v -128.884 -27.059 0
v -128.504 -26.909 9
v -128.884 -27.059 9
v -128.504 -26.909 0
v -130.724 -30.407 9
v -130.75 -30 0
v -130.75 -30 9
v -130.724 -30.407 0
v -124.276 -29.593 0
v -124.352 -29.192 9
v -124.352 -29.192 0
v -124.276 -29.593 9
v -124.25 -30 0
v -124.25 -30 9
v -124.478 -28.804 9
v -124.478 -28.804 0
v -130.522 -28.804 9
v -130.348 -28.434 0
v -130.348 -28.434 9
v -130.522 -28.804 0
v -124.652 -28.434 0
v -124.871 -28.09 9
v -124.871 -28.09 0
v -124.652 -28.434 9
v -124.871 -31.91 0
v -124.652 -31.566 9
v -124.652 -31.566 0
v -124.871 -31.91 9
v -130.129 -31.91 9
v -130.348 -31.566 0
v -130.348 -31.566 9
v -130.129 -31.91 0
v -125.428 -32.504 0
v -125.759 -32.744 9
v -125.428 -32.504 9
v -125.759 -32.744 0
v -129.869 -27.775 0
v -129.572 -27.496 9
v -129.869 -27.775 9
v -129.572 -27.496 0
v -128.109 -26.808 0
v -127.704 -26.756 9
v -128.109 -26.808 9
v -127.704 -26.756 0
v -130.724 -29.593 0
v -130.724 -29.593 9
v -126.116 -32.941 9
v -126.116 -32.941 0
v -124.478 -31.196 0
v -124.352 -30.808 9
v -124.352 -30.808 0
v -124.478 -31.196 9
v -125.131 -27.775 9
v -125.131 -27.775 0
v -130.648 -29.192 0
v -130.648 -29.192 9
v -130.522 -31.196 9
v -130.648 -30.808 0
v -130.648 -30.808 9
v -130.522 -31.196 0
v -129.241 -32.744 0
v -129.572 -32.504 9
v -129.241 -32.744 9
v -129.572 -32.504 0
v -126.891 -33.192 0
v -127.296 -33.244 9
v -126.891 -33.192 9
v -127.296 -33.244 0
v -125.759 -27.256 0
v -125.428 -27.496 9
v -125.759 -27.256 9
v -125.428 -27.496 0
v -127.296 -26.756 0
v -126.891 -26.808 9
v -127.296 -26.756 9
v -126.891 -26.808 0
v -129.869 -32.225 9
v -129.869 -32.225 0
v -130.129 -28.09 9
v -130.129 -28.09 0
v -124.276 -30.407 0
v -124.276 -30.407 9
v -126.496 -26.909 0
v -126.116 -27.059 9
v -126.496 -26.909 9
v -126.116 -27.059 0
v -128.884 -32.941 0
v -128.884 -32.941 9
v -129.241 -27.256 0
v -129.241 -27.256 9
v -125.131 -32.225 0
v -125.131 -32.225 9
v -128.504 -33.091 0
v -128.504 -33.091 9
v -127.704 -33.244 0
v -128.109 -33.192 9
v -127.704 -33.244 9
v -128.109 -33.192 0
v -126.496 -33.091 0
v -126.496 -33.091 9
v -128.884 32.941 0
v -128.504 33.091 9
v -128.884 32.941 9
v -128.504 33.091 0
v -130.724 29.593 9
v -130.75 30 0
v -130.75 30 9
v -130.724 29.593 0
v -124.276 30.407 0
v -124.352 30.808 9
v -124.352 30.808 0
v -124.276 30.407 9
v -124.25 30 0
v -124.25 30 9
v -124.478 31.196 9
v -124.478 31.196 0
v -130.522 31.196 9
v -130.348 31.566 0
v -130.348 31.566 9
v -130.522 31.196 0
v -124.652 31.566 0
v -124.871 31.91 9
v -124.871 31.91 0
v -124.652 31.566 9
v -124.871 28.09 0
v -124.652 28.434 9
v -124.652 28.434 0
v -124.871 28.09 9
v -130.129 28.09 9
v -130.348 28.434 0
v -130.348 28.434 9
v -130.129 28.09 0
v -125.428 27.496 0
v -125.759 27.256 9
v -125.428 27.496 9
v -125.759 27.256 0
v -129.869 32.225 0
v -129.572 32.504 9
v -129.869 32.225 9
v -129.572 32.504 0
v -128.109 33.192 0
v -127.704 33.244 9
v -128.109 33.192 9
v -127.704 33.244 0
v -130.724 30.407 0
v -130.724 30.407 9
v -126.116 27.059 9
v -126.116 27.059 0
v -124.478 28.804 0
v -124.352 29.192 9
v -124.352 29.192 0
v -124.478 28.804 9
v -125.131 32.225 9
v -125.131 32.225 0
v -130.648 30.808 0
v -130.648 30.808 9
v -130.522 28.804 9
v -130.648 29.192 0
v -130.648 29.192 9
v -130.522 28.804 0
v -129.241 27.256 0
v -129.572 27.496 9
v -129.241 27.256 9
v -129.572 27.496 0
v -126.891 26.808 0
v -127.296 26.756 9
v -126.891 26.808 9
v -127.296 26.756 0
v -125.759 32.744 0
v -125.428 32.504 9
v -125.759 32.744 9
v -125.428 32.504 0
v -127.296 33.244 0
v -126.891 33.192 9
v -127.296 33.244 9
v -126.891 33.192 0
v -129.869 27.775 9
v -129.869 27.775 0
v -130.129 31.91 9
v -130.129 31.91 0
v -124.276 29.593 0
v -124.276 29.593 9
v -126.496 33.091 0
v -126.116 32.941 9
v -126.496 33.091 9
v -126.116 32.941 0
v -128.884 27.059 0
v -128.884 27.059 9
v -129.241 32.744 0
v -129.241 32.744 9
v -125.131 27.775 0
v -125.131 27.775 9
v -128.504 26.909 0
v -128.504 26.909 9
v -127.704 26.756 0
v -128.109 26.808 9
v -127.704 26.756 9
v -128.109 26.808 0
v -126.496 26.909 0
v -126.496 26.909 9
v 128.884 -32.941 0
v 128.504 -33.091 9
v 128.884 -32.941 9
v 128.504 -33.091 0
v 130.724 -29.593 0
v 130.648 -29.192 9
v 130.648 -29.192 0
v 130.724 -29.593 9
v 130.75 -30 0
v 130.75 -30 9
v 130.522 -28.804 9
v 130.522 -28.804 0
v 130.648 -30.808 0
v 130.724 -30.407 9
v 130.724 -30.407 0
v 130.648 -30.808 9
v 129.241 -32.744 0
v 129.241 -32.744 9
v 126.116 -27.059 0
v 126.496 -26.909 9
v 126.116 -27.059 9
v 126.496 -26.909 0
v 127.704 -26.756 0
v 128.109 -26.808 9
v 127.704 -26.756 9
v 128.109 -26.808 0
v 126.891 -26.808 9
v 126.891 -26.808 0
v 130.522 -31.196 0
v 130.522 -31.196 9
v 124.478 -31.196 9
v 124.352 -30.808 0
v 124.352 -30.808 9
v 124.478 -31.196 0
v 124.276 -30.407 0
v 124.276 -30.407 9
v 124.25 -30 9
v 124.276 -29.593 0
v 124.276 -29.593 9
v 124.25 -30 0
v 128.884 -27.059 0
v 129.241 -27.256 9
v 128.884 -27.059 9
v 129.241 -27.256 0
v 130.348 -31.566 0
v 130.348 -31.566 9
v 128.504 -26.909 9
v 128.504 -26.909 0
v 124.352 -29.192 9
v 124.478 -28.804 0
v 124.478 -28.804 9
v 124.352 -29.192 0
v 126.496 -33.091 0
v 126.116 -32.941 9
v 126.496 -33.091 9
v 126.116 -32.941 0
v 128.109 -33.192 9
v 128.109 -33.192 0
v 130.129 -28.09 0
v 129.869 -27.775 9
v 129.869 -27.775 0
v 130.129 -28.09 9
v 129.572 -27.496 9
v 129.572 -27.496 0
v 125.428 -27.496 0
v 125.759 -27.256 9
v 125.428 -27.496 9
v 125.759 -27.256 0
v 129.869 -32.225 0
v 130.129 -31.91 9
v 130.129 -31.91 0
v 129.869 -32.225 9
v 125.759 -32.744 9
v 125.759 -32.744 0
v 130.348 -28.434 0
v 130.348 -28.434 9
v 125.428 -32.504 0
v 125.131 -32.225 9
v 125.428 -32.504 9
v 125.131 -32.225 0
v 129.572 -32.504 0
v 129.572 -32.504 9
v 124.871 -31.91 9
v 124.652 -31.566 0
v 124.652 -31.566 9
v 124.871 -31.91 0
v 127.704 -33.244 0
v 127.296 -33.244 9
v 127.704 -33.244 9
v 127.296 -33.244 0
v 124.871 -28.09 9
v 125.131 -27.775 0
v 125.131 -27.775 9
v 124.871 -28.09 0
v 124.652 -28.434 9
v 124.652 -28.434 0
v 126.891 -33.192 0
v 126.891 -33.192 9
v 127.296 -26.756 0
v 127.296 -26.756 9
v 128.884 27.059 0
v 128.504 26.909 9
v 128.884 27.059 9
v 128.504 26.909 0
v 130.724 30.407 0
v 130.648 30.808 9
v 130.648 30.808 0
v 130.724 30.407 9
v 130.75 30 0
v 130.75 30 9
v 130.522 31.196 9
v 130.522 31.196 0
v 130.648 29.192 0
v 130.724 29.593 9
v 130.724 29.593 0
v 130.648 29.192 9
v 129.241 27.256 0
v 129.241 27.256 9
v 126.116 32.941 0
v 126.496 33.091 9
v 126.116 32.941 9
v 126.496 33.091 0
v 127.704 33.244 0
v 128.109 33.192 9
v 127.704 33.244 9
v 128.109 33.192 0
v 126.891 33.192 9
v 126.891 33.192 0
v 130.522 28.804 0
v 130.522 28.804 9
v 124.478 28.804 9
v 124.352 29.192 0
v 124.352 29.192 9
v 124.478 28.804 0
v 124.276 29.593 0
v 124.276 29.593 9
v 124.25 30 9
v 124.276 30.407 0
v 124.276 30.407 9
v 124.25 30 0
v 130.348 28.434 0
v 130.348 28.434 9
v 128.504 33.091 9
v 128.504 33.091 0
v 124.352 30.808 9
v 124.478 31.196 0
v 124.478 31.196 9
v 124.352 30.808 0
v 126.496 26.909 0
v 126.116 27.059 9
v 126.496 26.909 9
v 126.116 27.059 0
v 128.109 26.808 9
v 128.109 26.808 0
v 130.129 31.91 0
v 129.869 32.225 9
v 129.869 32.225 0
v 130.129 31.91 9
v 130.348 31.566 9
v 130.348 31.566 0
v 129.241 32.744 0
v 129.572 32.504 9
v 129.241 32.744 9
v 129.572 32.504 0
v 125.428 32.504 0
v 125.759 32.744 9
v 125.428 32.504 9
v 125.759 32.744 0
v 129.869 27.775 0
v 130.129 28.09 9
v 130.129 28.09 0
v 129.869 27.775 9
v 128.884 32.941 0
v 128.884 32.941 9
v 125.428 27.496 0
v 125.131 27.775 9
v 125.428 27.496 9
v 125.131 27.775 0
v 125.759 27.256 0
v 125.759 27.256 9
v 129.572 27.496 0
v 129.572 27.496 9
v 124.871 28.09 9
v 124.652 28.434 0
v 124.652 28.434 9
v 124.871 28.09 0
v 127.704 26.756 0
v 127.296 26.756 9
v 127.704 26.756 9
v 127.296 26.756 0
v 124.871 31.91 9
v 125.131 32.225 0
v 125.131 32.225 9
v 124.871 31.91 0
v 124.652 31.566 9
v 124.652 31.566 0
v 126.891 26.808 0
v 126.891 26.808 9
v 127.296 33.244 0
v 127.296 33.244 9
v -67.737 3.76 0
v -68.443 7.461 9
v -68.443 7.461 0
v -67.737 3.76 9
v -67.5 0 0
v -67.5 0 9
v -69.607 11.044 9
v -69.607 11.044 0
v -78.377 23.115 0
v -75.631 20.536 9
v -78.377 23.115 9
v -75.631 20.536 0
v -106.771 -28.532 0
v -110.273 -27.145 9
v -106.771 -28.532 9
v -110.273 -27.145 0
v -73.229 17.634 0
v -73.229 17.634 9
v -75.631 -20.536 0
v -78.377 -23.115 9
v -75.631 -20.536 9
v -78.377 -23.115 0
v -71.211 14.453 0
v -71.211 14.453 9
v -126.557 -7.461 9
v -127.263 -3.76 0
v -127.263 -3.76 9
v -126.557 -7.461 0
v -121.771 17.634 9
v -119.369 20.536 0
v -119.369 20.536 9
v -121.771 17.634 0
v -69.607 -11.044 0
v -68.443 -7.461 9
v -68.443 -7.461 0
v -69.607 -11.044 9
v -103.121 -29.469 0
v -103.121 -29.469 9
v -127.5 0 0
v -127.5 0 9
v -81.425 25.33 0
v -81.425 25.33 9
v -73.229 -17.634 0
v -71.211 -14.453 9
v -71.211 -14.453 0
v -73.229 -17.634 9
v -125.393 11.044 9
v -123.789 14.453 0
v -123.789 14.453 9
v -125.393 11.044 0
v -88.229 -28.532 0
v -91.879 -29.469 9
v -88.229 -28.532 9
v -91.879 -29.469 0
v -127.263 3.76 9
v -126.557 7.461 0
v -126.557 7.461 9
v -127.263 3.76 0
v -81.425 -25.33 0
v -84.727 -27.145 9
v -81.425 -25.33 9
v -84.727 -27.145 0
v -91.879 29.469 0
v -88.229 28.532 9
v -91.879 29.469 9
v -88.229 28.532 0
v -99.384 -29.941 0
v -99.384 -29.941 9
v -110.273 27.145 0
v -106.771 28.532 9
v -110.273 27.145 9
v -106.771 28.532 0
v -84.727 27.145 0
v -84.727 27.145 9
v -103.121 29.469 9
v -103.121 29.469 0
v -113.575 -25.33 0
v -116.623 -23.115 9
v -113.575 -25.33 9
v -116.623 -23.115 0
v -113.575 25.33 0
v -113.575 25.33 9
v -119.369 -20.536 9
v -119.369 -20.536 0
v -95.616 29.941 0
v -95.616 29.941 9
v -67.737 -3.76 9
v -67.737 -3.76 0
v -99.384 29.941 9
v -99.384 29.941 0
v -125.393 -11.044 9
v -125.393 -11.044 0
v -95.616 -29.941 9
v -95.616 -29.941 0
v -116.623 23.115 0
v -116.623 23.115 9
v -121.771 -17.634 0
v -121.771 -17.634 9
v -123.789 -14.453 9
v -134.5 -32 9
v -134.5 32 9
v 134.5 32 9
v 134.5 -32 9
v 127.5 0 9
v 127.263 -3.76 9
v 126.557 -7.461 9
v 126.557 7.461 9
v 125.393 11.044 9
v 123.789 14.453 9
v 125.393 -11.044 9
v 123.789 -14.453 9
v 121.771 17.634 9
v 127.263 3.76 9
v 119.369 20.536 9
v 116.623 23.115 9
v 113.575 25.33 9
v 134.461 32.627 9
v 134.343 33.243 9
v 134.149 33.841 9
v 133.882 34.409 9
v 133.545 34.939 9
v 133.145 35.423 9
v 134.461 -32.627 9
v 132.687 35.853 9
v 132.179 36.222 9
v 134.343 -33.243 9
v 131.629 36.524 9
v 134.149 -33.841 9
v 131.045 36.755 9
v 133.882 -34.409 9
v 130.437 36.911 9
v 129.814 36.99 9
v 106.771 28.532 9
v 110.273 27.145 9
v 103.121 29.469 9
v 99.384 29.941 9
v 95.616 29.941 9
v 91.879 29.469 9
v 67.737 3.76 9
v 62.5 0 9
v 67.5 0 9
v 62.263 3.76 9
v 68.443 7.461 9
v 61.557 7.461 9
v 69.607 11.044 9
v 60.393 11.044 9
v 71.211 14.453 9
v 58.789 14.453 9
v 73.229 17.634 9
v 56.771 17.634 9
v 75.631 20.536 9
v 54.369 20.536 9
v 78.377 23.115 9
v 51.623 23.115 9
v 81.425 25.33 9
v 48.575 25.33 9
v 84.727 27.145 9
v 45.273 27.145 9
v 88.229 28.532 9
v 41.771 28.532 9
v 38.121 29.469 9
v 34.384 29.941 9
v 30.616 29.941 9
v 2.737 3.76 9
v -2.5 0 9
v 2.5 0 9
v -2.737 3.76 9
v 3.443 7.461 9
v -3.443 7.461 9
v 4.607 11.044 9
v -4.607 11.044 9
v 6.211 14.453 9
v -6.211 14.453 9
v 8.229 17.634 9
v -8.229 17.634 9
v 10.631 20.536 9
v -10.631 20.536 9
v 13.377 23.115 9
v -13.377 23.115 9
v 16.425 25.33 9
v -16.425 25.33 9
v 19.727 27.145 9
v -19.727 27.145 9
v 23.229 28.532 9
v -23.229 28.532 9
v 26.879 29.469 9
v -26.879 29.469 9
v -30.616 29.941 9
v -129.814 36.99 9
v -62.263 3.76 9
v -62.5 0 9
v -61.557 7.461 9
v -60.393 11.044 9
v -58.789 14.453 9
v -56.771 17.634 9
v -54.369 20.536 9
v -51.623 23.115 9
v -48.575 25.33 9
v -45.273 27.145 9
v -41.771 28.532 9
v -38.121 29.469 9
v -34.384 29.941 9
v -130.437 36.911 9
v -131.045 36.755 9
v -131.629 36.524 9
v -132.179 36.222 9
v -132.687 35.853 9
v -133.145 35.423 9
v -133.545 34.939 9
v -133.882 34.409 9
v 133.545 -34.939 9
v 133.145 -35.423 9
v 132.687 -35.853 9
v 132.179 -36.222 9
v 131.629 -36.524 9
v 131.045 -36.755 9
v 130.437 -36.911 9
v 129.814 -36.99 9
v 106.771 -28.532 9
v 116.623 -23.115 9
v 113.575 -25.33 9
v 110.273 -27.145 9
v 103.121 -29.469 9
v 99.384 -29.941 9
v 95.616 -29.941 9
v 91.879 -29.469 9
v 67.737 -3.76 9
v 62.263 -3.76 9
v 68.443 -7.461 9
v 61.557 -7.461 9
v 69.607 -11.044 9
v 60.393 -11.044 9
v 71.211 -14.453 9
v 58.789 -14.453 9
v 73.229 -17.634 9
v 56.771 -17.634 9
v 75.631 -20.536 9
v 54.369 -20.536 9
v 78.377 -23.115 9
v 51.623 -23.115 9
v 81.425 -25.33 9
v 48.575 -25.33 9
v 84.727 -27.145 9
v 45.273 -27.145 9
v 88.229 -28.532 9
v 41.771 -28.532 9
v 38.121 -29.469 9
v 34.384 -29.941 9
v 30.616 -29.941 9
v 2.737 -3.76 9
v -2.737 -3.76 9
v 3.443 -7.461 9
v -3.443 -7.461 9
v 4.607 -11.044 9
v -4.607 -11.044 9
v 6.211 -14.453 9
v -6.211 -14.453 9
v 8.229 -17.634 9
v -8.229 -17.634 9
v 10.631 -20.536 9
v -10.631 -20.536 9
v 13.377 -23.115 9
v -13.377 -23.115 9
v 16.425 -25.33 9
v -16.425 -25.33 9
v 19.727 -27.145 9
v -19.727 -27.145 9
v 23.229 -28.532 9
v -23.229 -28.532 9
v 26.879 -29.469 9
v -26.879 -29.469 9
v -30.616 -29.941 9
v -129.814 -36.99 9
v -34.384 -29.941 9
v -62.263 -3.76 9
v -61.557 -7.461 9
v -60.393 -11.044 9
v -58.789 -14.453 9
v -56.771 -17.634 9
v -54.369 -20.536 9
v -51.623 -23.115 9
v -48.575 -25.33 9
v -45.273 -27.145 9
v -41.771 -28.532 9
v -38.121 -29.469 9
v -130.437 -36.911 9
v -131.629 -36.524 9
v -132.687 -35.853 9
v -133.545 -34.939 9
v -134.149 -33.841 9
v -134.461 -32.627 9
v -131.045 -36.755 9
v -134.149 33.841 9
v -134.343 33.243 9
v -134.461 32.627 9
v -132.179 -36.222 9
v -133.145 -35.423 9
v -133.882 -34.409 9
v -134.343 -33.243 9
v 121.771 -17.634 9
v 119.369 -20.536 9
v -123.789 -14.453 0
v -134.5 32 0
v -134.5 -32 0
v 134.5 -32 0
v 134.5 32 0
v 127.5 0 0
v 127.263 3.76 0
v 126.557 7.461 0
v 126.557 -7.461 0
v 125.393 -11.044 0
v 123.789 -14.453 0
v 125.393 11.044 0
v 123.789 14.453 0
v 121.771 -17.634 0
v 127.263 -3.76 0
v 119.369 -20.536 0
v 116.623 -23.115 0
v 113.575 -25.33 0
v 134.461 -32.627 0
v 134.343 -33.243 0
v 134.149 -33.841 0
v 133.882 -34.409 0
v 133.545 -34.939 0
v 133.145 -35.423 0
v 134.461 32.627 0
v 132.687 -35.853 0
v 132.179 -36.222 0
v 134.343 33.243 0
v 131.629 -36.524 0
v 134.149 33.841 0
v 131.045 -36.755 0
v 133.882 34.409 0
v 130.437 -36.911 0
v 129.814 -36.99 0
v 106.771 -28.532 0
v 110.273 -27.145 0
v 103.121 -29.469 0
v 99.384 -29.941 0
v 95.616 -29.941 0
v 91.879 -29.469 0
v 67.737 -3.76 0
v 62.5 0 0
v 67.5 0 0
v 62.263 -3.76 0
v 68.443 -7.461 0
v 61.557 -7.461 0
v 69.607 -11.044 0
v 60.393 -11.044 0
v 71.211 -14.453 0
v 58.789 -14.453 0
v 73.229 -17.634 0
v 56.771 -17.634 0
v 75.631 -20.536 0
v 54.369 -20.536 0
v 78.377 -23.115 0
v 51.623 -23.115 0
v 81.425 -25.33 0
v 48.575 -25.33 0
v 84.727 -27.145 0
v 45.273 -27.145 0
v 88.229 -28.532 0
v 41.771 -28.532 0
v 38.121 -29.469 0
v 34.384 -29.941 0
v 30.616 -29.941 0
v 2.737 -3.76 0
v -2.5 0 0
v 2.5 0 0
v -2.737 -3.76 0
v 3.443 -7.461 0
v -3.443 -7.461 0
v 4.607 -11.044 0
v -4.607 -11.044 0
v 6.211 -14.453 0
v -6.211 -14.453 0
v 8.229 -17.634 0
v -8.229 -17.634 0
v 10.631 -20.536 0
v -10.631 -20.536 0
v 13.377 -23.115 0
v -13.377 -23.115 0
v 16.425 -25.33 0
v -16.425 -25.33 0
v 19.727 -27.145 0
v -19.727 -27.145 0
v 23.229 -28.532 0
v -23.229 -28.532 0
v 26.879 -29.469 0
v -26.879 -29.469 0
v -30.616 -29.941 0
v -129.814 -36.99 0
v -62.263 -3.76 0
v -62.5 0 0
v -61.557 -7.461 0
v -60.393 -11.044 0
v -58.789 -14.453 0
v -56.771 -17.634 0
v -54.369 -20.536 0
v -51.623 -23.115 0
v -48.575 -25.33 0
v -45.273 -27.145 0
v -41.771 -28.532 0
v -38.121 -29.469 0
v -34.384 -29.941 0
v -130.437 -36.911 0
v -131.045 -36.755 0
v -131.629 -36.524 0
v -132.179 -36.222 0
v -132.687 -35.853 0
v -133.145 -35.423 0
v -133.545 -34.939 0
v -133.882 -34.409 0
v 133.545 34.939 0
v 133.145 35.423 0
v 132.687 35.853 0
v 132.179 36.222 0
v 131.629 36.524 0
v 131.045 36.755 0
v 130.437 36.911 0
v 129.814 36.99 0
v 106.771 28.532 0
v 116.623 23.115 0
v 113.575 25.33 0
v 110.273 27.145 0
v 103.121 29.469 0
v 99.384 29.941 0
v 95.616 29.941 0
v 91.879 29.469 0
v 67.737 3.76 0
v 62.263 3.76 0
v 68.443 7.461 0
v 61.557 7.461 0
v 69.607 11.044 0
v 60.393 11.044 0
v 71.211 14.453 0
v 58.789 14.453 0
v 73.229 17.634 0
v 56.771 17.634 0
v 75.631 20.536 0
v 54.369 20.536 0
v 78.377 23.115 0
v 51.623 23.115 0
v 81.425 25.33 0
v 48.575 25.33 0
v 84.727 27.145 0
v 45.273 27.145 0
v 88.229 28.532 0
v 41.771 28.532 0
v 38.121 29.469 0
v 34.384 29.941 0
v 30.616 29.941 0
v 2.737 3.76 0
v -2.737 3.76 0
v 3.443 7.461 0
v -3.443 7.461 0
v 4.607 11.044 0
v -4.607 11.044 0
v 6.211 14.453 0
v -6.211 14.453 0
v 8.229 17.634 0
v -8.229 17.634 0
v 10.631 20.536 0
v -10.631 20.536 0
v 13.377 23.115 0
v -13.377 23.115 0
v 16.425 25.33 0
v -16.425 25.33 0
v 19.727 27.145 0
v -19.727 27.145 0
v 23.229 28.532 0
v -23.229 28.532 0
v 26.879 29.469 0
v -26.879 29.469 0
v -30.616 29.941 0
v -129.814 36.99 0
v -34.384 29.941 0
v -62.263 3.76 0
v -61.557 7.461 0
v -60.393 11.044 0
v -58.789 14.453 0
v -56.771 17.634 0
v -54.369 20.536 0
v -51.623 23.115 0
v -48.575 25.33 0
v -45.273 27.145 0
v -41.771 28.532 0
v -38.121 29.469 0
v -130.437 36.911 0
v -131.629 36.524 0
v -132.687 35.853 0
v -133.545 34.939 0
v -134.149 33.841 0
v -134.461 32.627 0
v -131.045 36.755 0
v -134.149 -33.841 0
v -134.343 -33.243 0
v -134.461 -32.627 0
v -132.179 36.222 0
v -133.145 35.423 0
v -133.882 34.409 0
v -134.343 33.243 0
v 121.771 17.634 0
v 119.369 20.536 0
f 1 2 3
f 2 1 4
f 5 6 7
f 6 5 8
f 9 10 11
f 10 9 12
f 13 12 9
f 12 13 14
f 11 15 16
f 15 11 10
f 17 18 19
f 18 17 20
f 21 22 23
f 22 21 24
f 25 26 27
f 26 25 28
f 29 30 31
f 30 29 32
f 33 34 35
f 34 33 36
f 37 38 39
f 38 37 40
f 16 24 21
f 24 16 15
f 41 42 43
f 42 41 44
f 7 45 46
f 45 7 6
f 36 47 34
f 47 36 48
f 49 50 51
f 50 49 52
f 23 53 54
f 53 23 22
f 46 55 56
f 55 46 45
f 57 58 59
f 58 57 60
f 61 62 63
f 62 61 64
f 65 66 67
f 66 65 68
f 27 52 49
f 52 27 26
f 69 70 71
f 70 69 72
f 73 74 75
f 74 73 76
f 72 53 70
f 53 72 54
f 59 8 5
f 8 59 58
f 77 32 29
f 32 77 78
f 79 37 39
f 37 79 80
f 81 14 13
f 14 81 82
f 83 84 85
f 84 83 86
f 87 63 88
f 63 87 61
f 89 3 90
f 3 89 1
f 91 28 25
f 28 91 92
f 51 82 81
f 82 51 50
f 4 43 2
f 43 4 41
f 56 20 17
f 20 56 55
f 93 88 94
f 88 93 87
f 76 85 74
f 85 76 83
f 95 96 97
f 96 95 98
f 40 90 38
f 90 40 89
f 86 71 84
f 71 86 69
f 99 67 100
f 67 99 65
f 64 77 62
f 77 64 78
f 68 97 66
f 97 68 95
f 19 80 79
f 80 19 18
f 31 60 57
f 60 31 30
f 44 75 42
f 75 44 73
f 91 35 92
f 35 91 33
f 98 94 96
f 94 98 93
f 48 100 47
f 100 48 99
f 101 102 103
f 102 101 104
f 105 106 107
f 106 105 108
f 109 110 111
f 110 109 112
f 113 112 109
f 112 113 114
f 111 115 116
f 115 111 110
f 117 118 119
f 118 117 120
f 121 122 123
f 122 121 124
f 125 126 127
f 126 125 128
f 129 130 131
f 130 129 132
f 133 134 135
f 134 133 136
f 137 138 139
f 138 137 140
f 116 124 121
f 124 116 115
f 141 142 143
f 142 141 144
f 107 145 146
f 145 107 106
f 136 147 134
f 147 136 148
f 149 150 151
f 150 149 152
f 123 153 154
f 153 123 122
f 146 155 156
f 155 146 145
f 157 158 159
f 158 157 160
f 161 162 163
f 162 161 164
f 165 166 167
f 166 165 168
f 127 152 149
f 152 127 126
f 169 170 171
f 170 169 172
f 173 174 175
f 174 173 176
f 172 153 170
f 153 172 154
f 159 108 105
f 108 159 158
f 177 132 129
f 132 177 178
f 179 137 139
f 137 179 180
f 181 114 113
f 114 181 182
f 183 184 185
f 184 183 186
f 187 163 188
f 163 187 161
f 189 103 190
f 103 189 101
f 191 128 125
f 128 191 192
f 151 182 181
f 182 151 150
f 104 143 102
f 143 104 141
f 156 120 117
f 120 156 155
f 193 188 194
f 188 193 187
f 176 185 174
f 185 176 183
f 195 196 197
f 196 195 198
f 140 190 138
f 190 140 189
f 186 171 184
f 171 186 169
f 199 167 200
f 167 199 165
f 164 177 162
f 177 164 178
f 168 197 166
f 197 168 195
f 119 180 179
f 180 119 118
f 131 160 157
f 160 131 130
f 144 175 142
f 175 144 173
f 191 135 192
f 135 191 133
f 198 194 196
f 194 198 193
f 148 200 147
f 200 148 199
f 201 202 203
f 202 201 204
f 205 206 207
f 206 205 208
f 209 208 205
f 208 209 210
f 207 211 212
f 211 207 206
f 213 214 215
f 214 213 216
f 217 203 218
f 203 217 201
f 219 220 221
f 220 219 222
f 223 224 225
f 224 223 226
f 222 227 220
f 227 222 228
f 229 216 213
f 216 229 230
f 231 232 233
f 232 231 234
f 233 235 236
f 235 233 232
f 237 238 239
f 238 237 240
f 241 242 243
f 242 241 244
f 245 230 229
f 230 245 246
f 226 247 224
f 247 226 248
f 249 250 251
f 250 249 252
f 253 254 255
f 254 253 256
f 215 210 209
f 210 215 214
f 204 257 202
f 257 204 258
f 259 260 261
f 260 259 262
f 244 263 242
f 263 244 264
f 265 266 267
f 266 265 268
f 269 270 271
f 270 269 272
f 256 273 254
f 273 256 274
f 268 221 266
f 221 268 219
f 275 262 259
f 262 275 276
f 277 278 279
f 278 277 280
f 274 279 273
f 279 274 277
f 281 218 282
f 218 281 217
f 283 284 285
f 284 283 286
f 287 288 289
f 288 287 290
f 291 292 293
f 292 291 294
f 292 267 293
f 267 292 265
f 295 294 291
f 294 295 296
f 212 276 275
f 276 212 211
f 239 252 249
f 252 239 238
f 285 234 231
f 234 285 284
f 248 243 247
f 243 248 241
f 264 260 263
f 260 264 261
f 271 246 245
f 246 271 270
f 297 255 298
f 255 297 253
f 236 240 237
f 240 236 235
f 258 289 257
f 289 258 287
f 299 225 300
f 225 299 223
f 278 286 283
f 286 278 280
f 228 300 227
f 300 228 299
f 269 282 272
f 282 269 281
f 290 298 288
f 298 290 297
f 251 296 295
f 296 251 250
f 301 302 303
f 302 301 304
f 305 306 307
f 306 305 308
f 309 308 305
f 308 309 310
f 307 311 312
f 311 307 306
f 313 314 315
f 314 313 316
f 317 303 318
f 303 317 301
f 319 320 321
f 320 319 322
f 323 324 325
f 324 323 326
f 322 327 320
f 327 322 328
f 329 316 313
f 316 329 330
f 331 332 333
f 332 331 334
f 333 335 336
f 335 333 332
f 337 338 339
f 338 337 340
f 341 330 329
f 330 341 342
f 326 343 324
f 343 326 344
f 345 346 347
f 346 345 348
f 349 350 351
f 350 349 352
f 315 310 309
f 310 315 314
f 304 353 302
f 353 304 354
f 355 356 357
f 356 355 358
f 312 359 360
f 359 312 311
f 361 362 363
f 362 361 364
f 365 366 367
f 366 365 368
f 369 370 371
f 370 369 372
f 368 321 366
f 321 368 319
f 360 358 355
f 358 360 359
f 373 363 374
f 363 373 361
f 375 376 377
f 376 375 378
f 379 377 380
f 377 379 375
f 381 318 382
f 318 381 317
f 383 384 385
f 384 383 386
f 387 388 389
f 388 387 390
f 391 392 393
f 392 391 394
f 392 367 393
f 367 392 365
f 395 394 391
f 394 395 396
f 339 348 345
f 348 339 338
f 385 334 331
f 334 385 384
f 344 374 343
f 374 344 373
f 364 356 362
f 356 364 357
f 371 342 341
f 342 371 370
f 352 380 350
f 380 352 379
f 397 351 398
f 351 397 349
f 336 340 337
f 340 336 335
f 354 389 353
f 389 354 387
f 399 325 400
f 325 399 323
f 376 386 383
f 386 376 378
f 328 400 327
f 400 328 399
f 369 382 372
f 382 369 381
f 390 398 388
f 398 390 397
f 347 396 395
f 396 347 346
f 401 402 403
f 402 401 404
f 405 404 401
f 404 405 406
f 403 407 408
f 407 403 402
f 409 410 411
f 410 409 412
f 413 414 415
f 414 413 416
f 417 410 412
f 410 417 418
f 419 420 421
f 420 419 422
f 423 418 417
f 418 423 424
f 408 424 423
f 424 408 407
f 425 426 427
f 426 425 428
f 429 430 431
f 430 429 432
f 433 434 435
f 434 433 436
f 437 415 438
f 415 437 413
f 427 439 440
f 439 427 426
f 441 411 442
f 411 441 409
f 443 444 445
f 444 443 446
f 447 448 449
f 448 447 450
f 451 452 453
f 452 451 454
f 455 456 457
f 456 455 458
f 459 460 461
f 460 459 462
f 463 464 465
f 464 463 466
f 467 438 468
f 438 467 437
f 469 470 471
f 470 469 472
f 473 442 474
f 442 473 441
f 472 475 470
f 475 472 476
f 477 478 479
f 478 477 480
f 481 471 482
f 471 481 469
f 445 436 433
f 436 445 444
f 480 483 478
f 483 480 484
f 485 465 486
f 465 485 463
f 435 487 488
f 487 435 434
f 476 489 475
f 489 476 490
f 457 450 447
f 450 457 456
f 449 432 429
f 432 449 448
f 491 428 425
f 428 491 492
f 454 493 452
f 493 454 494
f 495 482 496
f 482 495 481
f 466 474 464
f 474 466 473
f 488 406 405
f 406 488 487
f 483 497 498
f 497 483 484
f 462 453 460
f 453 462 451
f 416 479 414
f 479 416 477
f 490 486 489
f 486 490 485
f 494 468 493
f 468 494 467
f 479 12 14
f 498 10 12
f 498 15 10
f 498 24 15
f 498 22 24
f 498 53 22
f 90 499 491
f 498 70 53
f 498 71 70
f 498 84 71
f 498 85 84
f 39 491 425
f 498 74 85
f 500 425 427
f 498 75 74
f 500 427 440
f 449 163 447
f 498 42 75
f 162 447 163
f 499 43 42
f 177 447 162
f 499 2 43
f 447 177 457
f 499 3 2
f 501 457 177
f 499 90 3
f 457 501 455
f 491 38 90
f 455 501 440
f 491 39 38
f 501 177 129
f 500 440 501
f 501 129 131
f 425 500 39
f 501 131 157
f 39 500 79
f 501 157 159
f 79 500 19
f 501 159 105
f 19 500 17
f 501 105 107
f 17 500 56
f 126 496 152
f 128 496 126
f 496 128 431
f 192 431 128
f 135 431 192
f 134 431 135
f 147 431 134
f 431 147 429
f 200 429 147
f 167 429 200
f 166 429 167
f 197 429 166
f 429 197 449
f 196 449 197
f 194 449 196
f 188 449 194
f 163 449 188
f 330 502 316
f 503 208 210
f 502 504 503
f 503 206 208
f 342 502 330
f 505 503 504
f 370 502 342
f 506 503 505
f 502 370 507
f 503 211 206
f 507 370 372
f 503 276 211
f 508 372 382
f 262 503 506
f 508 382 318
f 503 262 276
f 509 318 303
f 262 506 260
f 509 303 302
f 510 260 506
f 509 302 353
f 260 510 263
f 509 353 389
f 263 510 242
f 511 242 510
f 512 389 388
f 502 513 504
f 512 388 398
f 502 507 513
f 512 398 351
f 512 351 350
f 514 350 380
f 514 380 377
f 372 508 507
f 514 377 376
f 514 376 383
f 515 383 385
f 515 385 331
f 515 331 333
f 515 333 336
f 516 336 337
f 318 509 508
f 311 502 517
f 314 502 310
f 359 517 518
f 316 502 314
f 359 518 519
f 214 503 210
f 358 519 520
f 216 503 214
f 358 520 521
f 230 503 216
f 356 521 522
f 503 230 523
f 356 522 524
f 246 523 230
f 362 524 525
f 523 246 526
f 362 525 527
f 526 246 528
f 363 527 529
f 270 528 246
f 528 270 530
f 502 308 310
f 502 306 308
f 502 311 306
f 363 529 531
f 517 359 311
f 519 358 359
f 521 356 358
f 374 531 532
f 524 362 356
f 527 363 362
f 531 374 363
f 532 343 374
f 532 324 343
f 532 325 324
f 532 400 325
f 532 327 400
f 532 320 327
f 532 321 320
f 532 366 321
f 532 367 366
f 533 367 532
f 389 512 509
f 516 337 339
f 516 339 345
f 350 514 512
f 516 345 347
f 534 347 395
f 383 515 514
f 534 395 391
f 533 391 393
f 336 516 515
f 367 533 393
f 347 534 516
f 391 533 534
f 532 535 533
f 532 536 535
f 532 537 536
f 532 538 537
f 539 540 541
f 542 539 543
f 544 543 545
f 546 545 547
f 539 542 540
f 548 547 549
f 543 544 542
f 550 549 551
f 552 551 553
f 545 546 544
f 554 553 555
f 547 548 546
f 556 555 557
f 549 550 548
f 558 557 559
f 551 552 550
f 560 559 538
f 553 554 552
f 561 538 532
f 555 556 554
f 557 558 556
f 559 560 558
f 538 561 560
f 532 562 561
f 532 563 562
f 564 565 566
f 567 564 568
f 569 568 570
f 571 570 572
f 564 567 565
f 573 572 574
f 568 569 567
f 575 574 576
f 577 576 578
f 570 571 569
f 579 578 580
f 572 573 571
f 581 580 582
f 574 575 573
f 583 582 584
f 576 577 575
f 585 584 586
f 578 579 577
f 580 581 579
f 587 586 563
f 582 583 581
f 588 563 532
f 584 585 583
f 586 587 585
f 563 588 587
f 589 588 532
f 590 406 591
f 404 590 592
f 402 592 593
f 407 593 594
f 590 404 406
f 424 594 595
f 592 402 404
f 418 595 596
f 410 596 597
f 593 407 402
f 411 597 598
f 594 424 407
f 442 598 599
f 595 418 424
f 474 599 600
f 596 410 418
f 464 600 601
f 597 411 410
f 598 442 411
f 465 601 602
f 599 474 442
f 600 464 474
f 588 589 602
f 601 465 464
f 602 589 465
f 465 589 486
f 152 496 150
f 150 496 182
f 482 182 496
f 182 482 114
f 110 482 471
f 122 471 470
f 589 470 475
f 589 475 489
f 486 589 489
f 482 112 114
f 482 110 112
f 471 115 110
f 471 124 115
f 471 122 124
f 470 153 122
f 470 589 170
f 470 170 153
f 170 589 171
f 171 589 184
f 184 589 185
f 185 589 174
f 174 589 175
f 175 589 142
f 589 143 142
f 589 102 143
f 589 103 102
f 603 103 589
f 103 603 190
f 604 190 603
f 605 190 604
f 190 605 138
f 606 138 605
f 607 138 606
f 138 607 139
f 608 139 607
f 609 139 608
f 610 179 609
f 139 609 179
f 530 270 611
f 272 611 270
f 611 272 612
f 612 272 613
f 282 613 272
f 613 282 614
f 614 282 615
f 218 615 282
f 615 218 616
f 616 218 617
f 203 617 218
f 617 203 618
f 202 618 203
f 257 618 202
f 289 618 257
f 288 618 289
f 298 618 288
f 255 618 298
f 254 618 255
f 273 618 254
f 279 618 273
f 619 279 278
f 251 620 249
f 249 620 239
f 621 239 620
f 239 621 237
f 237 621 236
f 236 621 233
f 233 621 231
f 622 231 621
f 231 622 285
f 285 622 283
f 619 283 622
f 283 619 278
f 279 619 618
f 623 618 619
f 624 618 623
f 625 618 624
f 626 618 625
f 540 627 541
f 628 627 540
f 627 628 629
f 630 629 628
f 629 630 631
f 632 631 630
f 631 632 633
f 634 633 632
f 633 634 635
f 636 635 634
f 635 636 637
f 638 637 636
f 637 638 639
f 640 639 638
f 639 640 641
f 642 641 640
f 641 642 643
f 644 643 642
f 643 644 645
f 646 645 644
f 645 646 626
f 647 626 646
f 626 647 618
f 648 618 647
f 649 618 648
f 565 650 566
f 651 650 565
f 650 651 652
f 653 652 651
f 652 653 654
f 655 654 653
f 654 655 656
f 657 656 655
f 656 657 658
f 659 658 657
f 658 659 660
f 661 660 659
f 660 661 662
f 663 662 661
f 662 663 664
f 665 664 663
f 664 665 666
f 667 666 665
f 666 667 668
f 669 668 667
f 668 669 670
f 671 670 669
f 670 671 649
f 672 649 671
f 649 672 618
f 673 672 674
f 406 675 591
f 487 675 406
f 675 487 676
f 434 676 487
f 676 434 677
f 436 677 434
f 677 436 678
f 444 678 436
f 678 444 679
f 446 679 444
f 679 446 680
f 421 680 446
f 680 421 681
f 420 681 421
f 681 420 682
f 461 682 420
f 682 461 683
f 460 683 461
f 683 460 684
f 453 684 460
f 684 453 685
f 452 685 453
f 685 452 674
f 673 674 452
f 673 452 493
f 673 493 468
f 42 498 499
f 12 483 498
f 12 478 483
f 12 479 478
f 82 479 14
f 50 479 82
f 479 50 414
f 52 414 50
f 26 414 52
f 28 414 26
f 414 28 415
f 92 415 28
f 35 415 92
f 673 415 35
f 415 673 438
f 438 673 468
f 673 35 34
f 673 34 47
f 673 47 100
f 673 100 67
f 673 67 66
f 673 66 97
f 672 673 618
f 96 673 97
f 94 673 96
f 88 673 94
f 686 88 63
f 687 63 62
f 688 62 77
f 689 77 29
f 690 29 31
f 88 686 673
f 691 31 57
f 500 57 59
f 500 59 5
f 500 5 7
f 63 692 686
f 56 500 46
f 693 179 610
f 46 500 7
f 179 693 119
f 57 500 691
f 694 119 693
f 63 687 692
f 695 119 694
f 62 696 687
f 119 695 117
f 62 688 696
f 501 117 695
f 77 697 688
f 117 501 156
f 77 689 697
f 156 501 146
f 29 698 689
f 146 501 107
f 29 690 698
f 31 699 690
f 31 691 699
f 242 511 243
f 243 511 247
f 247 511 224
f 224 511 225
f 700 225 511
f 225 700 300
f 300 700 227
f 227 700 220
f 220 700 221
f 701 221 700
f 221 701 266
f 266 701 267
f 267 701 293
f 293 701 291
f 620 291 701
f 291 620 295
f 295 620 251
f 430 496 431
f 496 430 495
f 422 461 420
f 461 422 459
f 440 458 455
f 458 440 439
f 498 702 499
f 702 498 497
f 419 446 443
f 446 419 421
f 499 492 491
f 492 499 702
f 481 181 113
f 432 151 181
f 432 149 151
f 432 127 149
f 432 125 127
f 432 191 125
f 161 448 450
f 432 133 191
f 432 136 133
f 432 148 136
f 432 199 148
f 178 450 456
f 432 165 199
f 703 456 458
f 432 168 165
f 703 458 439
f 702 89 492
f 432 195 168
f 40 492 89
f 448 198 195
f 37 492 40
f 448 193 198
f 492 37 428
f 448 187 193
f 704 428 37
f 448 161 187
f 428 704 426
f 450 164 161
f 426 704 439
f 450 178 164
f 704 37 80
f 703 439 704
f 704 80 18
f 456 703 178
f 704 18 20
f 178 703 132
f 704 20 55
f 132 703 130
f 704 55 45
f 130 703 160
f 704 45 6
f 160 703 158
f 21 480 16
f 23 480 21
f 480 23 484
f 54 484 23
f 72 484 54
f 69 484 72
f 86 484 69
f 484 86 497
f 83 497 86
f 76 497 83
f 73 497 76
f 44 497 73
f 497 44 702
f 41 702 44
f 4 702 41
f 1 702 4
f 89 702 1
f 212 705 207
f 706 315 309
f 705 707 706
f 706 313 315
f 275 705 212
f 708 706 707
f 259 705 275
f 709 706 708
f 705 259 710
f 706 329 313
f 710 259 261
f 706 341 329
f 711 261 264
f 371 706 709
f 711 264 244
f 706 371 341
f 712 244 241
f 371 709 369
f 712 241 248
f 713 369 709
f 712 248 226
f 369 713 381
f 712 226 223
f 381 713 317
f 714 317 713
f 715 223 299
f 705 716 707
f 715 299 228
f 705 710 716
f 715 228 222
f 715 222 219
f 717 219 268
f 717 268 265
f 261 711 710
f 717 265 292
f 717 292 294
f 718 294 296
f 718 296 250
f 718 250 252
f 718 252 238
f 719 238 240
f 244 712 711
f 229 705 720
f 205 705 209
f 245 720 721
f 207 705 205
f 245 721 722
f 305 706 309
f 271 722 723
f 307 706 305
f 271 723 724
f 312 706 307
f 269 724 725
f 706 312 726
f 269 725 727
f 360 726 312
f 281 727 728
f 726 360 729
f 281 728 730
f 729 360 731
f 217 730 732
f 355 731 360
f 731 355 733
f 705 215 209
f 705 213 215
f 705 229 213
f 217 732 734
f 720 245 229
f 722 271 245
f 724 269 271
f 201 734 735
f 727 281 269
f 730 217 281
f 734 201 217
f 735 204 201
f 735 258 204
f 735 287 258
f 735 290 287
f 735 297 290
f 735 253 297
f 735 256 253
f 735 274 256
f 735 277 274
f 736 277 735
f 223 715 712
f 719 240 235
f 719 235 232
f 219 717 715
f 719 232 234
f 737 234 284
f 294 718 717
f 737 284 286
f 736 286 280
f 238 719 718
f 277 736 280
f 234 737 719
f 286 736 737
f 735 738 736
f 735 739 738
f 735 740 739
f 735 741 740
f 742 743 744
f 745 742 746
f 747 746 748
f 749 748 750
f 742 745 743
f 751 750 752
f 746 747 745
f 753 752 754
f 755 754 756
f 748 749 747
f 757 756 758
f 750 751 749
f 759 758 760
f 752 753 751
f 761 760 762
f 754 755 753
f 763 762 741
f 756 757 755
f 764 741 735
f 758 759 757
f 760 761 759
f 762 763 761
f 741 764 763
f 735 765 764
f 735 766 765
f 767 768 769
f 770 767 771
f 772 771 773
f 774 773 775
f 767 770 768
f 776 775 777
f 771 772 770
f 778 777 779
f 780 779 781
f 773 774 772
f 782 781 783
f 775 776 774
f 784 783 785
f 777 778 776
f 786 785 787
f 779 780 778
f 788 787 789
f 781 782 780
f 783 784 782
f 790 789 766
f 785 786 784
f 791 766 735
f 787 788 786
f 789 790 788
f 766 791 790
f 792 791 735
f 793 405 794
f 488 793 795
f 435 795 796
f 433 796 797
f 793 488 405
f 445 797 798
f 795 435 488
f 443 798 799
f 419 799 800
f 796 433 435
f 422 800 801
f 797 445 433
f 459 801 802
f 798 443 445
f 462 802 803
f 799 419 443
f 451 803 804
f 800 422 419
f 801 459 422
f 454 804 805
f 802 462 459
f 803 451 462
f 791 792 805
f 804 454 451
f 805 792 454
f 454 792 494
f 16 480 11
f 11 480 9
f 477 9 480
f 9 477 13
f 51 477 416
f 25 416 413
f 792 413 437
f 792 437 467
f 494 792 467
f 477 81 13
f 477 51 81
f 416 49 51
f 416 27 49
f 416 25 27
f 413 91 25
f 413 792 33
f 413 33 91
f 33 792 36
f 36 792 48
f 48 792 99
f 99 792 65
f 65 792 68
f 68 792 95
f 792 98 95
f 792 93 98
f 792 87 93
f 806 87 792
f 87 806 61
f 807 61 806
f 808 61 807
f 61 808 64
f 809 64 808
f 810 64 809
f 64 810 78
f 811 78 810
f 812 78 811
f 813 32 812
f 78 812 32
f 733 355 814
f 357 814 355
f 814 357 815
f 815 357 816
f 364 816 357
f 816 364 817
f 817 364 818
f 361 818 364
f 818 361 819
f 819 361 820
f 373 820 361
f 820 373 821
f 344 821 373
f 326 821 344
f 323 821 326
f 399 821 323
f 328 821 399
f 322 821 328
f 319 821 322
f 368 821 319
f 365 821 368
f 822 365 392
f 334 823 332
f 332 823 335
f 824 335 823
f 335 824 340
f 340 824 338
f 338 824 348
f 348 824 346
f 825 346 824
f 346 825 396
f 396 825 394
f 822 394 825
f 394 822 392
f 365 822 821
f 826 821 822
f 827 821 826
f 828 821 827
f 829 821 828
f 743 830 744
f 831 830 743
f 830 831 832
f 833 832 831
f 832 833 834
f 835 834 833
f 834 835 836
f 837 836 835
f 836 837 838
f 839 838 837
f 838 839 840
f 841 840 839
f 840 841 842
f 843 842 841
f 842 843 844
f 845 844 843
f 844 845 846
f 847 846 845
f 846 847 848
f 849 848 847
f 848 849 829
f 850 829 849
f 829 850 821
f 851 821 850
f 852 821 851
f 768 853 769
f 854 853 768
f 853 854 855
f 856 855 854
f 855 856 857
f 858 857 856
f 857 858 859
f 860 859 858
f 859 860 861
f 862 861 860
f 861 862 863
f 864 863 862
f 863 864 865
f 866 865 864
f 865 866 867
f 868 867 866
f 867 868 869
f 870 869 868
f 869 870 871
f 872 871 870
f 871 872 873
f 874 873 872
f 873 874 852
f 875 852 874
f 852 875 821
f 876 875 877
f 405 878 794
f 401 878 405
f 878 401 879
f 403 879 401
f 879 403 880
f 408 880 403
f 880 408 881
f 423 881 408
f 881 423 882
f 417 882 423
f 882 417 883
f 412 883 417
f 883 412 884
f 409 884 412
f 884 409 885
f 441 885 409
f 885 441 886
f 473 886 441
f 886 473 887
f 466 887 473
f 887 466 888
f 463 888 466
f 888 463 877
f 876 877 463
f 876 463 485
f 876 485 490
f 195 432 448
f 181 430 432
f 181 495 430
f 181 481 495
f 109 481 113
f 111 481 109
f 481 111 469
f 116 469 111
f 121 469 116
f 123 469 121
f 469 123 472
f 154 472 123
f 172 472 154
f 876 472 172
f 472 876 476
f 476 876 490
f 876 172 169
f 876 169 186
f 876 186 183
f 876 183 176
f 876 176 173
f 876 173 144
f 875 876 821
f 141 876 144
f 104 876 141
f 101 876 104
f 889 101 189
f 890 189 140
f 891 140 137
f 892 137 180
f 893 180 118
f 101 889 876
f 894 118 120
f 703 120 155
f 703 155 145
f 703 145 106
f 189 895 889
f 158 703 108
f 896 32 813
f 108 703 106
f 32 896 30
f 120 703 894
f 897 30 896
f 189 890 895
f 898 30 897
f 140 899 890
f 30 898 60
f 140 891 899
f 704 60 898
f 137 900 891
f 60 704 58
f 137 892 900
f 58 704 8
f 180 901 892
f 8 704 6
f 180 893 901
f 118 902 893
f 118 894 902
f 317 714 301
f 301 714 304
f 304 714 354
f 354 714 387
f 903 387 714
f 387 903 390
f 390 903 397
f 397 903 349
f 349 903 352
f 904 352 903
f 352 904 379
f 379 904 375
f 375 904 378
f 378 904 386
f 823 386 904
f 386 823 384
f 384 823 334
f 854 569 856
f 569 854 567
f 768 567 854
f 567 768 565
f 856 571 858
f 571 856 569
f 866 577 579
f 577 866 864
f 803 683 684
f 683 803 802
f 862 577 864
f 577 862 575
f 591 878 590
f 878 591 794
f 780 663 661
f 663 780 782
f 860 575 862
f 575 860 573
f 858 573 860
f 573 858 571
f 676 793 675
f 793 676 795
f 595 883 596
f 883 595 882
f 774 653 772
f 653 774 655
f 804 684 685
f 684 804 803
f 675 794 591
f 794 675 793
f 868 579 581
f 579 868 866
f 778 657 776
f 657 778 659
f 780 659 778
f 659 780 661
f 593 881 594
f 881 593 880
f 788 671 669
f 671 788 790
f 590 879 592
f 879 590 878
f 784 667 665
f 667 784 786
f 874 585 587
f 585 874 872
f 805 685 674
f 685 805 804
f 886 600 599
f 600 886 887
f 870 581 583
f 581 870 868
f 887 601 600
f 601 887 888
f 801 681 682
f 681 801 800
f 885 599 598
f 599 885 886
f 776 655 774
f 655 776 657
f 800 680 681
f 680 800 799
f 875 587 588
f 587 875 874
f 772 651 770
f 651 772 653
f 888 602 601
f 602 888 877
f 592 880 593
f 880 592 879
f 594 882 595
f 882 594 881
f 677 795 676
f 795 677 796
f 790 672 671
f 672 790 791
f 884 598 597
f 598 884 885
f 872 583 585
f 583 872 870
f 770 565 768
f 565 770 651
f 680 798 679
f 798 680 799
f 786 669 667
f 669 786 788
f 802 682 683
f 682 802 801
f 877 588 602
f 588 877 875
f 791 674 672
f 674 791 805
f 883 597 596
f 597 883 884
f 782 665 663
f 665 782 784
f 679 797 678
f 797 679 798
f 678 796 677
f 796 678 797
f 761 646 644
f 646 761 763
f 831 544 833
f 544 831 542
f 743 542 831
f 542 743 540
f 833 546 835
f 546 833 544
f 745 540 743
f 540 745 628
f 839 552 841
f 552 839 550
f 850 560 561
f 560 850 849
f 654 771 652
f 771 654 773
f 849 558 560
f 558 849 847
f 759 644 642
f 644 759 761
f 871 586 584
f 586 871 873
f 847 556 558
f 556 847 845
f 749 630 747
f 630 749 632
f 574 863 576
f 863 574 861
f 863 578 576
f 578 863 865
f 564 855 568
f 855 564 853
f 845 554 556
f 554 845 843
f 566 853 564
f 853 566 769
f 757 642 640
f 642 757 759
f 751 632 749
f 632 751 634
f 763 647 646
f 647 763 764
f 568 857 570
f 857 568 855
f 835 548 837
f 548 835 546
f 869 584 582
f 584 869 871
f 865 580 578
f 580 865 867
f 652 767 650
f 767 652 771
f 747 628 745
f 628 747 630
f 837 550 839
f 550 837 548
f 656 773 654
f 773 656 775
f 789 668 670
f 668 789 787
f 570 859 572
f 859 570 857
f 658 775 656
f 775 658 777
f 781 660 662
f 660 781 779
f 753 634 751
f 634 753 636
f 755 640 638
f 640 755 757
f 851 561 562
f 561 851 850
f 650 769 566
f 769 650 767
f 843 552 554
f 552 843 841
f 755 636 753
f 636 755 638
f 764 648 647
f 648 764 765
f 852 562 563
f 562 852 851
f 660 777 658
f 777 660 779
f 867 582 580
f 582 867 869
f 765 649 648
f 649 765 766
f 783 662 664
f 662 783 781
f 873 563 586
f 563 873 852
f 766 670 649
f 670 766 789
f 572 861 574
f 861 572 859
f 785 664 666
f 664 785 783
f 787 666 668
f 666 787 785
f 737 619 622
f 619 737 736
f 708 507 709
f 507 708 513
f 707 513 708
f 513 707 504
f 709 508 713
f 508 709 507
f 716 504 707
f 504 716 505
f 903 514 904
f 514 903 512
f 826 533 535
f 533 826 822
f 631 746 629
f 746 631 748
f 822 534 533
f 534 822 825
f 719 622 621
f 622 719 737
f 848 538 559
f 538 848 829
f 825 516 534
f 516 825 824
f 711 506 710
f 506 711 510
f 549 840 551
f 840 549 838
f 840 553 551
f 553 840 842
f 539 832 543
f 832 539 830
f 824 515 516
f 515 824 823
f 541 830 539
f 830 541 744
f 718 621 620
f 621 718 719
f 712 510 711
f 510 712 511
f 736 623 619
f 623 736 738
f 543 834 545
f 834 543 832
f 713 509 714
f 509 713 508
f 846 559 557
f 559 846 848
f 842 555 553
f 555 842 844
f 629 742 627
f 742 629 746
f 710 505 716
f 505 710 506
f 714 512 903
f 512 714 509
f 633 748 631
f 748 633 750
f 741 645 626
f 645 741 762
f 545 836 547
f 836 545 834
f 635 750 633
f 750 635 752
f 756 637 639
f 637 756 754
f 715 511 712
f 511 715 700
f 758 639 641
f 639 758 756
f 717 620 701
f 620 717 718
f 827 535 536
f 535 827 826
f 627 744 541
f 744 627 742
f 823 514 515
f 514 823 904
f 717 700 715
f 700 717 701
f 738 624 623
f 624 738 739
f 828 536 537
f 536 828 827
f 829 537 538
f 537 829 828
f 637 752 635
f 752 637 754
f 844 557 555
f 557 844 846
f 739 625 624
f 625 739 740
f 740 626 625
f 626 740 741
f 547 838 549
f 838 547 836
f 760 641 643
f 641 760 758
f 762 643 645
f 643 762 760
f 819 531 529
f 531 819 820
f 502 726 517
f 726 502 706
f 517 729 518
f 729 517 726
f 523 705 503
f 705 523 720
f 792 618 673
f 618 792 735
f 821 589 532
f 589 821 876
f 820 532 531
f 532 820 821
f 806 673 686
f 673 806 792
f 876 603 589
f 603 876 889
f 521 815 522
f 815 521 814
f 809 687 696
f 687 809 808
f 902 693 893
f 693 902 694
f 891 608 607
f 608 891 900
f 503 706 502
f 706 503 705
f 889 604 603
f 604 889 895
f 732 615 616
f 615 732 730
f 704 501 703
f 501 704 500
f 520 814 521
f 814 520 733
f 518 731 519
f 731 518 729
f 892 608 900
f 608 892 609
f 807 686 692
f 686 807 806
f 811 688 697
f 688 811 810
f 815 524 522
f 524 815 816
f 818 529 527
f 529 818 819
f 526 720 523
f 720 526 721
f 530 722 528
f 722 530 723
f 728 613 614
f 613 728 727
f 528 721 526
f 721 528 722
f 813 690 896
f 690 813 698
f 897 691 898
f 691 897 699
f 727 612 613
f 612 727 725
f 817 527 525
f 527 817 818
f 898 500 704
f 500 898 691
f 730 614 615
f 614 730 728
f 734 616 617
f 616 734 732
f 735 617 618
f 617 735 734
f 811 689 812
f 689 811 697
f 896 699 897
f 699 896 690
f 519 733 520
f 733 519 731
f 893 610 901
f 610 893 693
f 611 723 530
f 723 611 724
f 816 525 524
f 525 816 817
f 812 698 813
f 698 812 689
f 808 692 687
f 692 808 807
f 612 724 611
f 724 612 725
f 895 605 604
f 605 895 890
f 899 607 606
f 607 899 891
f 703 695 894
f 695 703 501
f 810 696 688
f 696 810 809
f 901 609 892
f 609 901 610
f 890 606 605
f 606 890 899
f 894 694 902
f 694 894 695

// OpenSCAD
$fn = 50;


difference() {
	union() {
		hull() {
			translate(v = [-129.5000000000, 32.0000000000, 0]) {
				cylinder(h = 9, r = 5);
			}
			translate(v = [129.5000000000, 32.0000000000, 0]) {
				cylinder(h = 9, r = 5);
			}
			translate(v = [-129.5000000000, -32.0000000000, 0]) {
				cylinder(h = 9, r = 5);
			}
			translate(v = [129.5000000000, -32.0000000000, 0]) {
				cylinder(h = 9, r = 5);
			}
		}
	}
	union() {
		#translate(v = [-127.5000000000, -30.0000000000, -100.0000000000]) {
			cylinder(h = 200, r = 3.2500000000);
		}
		#translate(v = [-127.5000000000, 30.0000000000, -100.0000000000]) {
			cylinder(h = 200, r = 3.2500000000);
		}
		#translate(v = [127.5000000000, -30.0000000000, -100.0000000000]) {
			cylinder(h = 200, r = 3.2500000000);
		}
		#translate(v = [127.5000000000, 30.0000000000, -100.0000000000]) {
			cylinder(h = 200, r = 3.2500000000);
		}
		#translate(v = [-97.5000000000, 0, 0]) {
			cylinder(h = 9, r = 30.0000000000);
		}
		#translate(v = [-32.5000000000, 0, 0]) {
			cylinder(h = 9, r = 30.0000000000);
		}
		#translate(v = [32.5000000000, 0, 0]) {
			cylinder(h = 9, r = 30.0000000000);
		}
		#translate(v = [97.5000000000, 0, 0]) {
			cylinder(h = 9, r = 30.0000000000);
		}
	}
}
